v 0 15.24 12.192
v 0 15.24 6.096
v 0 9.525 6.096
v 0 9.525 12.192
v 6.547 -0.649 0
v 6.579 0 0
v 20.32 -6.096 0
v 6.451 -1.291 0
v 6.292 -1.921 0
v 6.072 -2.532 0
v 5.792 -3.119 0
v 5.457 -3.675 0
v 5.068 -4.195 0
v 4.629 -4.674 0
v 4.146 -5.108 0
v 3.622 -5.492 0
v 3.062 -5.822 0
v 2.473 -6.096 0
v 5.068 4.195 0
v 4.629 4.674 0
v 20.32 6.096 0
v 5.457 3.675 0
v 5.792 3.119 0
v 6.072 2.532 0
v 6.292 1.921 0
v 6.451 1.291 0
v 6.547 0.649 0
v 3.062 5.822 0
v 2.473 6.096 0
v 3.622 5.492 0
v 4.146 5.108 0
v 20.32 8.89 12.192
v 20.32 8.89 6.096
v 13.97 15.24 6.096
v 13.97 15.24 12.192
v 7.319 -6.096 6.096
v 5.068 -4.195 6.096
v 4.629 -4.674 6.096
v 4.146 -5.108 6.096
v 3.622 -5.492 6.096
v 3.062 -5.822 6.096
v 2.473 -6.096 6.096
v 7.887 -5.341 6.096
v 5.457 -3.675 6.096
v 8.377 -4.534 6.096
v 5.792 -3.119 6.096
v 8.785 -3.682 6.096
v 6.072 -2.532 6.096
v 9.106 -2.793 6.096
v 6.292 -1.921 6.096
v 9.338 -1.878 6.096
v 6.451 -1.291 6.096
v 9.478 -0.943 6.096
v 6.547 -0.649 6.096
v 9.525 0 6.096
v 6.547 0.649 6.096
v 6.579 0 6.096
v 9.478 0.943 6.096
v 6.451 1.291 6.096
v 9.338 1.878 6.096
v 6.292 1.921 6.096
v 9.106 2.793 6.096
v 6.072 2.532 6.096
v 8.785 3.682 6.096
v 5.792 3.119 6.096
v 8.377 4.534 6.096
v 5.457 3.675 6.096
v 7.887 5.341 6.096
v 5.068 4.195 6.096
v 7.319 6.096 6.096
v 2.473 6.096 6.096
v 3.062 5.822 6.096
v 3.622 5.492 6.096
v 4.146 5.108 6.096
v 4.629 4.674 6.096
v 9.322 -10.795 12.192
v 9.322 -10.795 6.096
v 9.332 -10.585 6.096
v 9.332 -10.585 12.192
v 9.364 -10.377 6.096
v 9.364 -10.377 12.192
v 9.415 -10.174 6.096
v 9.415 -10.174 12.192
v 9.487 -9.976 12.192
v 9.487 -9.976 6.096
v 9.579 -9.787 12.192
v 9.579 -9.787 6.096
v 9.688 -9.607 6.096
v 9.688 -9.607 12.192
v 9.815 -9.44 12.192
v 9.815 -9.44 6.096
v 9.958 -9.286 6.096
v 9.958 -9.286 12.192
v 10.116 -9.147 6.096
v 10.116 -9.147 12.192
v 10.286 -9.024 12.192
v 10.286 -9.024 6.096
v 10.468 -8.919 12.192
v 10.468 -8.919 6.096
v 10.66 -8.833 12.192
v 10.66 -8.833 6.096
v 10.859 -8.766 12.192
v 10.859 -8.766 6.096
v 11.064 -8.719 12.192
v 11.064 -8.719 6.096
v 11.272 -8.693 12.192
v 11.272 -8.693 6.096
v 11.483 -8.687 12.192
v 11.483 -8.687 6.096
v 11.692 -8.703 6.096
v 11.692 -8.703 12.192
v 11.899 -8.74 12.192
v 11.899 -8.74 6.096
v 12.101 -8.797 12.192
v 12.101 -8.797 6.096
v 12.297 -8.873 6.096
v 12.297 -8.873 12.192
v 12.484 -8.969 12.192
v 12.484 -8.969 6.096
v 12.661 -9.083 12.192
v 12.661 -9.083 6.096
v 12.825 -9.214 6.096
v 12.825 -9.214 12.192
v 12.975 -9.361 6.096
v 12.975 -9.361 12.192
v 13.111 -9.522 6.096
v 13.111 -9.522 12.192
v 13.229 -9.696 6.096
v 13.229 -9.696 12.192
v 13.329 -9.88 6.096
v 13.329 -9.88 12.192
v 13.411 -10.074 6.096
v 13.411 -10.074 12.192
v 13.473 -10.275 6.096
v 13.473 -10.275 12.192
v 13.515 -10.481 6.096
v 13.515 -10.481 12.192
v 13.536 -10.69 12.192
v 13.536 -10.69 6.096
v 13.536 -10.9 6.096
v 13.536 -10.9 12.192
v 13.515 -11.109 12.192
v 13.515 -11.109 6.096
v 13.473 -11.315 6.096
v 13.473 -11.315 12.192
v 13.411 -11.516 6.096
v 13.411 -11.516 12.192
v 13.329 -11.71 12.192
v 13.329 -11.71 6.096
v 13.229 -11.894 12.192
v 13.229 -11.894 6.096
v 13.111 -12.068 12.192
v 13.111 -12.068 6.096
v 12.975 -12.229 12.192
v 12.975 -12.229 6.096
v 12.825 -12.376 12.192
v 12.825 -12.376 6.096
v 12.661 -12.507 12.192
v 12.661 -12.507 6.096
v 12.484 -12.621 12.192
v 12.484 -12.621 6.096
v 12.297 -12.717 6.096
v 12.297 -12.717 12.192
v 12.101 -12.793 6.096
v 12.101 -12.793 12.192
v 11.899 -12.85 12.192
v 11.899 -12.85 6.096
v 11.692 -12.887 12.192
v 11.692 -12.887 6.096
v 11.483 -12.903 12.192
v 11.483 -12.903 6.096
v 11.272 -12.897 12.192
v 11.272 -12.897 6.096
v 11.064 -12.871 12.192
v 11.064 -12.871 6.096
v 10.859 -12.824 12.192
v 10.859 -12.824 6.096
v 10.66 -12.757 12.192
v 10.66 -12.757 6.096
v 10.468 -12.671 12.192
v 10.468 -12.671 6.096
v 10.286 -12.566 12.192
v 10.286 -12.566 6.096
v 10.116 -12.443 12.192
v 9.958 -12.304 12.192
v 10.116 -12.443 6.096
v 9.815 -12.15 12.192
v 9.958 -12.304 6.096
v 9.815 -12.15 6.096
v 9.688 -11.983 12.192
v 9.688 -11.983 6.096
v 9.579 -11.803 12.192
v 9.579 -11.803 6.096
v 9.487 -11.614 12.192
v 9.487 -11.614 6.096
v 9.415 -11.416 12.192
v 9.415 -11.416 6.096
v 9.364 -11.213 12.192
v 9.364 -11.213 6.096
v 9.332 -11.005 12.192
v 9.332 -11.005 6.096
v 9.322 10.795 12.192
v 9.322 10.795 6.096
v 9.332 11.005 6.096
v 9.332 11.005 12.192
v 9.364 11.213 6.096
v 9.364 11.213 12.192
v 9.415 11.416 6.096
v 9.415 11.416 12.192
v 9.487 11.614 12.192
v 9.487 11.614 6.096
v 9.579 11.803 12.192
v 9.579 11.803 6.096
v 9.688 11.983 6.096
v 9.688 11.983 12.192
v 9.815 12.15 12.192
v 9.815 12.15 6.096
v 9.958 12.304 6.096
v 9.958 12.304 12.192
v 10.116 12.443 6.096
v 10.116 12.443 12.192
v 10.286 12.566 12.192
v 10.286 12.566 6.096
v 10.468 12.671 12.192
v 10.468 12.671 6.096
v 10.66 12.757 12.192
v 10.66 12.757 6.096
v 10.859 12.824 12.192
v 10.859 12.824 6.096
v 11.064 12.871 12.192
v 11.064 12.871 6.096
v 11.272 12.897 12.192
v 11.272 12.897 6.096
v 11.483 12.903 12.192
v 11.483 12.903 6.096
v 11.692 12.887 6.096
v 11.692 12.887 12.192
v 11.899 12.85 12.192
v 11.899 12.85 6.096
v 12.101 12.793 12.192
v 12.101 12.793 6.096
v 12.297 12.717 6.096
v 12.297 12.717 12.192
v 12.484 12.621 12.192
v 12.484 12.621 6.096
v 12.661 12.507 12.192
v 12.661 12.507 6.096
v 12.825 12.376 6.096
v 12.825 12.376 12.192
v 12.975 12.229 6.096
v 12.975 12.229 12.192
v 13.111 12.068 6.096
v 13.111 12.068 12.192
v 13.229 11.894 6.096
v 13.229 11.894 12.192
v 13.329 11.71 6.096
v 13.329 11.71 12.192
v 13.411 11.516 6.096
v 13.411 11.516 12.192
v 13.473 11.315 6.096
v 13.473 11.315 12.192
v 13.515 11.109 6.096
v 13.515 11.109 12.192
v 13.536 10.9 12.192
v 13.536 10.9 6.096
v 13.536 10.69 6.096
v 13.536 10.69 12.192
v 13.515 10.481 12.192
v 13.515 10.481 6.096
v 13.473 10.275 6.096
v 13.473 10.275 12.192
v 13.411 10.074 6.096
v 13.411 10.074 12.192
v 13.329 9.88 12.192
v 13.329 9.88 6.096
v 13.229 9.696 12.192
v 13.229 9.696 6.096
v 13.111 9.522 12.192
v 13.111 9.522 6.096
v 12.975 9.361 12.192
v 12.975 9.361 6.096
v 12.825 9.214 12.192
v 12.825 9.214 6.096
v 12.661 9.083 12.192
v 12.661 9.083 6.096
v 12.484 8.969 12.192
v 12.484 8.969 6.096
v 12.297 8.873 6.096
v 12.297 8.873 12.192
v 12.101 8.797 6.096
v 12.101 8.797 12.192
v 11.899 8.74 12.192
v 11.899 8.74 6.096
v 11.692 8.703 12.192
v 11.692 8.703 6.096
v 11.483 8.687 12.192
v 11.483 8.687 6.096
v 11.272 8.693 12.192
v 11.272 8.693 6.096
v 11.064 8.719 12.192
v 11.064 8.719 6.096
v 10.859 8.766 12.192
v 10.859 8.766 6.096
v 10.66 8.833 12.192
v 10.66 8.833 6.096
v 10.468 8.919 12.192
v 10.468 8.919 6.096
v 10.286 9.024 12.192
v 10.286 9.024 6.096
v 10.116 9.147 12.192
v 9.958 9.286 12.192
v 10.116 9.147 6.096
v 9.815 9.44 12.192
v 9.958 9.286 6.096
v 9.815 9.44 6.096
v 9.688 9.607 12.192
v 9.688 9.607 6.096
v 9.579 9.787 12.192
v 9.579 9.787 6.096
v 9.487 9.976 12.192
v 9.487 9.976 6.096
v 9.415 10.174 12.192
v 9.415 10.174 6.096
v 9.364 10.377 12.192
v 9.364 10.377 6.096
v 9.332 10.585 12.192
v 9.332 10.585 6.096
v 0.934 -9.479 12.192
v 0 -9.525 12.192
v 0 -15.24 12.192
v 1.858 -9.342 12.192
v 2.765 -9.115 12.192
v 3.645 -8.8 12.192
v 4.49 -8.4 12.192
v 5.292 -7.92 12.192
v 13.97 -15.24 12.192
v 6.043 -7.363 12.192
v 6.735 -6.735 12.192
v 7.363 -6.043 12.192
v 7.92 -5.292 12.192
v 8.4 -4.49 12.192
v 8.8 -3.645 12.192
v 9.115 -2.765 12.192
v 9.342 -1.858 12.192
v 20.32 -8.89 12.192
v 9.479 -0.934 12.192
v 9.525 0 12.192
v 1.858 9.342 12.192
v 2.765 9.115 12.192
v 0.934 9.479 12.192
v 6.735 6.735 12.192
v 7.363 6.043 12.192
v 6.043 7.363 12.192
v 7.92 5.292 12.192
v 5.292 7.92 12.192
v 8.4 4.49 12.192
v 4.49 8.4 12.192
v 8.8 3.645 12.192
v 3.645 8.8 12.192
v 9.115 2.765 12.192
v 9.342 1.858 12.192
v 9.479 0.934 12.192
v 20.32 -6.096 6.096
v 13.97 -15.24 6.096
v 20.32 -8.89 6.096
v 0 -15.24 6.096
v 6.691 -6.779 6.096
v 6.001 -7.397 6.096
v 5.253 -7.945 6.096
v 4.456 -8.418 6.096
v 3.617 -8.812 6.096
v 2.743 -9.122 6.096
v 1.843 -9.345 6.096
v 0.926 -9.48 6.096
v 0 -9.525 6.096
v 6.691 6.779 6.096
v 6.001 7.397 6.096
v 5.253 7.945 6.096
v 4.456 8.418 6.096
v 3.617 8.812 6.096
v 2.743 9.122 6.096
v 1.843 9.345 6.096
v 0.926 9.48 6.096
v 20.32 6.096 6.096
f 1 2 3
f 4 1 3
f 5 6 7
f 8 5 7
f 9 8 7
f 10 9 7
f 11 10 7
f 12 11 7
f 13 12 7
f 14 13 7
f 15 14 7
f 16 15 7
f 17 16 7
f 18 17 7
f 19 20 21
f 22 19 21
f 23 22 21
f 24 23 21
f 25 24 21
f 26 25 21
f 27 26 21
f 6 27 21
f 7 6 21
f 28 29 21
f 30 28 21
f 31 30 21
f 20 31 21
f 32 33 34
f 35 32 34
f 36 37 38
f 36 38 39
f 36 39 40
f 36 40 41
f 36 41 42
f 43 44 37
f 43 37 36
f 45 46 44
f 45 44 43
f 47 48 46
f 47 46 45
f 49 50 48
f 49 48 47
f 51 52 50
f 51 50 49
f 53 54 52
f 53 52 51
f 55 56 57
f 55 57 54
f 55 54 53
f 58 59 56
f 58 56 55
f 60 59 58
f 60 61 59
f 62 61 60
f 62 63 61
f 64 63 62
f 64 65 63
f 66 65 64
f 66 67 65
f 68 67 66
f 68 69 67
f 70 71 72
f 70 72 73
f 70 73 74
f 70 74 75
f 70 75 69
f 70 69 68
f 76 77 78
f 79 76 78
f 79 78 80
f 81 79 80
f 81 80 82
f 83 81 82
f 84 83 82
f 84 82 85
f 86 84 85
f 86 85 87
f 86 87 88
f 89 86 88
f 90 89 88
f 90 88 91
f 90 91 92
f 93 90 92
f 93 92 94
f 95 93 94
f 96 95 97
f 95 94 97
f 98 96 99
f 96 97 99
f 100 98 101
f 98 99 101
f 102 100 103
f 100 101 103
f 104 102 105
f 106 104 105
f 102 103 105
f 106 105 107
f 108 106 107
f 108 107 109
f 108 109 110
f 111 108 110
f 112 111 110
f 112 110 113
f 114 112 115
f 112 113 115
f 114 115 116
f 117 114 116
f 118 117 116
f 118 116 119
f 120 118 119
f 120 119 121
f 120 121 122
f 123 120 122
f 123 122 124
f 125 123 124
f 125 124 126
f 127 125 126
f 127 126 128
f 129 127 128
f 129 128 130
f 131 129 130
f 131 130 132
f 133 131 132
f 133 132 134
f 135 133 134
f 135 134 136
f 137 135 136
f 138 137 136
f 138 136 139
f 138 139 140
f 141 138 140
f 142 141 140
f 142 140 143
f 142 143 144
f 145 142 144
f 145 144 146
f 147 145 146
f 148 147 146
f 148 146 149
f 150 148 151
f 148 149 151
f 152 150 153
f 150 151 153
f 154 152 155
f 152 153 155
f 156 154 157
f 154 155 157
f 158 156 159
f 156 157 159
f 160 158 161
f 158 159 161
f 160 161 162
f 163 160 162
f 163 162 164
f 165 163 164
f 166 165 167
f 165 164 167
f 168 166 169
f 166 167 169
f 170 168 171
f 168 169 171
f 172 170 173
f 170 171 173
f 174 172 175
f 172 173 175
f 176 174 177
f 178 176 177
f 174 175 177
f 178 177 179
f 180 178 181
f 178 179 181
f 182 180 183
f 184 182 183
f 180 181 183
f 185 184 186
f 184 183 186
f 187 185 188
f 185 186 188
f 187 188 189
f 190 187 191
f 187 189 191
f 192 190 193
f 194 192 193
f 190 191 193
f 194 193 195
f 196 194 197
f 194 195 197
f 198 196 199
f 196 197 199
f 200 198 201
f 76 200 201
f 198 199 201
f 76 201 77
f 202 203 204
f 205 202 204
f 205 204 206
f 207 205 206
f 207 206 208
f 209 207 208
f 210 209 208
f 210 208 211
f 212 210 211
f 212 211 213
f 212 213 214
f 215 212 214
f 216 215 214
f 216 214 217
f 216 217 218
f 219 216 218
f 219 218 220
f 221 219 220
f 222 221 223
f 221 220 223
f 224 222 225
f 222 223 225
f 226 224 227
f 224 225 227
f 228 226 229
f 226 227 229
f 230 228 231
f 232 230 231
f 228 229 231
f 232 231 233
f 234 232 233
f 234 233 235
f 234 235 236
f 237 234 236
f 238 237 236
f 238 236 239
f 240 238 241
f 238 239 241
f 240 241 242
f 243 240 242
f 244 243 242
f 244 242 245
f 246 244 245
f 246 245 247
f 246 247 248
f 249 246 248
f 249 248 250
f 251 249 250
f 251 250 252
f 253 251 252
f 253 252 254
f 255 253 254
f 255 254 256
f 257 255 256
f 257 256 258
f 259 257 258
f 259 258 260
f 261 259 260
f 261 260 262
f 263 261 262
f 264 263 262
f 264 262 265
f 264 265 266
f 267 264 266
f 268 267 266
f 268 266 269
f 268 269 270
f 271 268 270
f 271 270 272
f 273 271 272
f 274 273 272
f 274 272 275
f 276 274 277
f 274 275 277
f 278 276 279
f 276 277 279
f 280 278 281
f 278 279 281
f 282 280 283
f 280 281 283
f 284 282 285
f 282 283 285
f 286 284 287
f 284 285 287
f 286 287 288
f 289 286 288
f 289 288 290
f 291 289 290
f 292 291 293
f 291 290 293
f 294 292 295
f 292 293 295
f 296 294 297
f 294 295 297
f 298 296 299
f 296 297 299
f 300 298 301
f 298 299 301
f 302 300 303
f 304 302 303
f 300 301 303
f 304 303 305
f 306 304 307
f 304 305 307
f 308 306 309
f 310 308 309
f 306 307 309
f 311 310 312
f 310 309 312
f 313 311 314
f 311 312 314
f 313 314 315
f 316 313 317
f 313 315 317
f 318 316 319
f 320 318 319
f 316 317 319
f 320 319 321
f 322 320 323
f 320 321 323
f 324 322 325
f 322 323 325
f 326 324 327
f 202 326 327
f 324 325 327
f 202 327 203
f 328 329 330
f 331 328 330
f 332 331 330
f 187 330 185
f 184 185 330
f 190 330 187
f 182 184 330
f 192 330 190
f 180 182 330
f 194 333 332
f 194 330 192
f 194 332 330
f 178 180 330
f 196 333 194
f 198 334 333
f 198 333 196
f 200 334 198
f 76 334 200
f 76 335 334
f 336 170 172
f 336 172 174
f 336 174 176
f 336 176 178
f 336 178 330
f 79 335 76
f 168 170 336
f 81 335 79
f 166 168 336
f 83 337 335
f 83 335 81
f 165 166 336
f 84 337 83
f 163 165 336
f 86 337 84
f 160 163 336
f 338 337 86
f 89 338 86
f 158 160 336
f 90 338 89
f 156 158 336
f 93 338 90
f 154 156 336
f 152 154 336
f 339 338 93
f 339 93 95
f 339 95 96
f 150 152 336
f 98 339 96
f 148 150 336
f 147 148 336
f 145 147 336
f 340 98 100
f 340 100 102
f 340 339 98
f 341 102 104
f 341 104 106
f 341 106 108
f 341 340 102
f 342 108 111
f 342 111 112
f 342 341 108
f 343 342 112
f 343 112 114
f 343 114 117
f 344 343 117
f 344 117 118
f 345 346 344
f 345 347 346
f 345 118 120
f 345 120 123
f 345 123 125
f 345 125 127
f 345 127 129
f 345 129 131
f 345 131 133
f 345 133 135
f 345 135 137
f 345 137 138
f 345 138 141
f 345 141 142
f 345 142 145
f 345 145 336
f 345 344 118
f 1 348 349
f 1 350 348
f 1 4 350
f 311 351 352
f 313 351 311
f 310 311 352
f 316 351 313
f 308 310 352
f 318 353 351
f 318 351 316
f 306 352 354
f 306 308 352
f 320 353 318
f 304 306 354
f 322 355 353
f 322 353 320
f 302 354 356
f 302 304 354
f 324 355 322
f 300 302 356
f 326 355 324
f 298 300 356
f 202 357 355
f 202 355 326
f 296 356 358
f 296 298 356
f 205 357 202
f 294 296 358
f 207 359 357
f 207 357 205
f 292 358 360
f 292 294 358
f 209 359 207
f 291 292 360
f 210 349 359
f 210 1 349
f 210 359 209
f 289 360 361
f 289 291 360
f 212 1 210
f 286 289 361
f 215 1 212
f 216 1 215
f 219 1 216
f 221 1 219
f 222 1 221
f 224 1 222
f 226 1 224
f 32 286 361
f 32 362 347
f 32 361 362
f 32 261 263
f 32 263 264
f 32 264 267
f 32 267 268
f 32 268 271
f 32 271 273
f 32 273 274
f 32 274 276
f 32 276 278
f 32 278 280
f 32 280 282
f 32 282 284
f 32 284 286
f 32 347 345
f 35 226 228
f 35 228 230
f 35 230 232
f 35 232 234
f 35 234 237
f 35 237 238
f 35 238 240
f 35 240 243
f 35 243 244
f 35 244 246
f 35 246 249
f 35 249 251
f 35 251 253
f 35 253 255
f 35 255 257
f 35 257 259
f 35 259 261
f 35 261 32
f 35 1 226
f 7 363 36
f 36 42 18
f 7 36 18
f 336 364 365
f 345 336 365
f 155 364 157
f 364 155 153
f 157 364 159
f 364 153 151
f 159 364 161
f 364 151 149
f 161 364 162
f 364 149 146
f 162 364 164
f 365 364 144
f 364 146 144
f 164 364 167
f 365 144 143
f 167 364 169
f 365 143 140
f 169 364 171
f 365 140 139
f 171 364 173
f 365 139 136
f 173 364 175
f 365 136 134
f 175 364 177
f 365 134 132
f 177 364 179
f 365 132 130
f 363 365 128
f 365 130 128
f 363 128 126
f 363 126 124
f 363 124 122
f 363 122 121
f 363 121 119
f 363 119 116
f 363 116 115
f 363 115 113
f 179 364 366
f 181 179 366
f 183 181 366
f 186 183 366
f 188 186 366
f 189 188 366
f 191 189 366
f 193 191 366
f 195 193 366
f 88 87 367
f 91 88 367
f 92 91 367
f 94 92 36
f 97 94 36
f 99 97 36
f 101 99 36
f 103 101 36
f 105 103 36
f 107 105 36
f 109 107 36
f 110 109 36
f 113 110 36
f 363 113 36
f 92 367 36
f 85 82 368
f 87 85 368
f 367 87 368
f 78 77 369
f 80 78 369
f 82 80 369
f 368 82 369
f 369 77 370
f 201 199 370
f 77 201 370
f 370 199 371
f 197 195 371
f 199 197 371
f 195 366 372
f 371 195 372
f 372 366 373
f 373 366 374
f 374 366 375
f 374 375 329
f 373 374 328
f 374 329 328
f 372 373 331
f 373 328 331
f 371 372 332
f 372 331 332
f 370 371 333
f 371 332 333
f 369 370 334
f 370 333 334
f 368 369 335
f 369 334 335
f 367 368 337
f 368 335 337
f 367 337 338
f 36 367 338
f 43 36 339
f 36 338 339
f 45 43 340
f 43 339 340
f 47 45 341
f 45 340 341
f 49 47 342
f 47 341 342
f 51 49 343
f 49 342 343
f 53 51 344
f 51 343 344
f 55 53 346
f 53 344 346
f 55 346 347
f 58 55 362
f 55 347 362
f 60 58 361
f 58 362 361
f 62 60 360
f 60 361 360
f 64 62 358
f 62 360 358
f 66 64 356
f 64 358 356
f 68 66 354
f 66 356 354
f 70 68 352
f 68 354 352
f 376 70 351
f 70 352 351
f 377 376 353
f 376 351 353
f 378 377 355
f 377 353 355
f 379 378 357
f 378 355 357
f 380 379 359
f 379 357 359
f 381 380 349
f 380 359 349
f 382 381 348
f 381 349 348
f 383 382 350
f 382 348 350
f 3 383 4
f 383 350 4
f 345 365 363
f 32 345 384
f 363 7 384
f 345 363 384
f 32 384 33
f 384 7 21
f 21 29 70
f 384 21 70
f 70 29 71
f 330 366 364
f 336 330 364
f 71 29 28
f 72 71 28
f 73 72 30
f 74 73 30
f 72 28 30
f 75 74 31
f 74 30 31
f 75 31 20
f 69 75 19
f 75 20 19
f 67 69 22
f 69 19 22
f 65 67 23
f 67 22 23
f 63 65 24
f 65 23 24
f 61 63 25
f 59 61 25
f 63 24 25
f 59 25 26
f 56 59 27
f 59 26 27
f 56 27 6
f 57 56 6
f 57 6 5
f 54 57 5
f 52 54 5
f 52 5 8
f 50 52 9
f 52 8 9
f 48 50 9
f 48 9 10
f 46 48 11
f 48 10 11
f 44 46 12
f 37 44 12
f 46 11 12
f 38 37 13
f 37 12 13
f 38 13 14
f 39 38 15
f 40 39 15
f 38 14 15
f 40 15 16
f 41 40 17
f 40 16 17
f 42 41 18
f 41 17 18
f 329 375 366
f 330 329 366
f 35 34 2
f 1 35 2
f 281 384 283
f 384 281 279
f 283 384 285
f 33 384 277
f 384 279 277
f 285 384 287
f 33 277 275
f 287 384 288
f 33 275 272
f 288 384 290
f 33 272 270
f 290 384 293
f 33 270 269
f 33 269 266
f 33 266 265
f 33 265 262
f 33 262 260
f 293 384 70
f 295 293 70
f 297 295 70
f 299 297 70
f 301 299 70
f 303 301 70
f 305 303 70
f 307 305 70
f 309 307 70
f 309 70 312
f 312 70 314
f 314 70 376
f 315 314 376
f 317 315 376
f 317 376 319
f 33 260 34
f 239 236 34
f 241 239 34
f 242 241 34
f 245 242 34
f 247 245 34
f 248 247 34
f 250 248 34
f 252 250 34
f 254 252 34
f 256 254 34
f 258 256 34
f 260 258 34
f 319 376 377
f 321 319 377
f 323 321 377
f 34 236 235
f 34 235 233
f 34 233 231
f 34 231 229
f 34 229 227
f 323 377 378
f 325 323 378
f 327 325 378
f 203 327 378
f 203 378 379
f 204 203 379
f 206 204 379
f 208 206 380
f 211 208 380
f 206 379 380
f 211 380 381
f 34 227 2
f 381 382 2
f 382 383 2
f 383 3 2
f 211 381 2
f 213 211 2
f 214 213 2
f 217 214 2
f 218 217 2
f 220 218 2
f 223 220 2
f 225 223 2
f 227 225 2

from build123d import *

# Parameters (mm, degrees)
F1_DEPTH = 12.192
F3_DEPTH = 20.321
F4_R     = 9.525
F5_DEPTH = 6.096
F7_D     = 4.2164


with BuildPart() as f1:
    # F0 (on Top) → F1 (new body)
    with BuildSketch(Plane.XY):
        with BuildLine():
            ThreePointArc((0, 6.5786), (6.5786, 0), (0, -6.5786))
            Line((0, -6.5786), (0, -15.24))
            Line((0, -15.24), (13.97, -15.24))
            Line((13.97, -15.24), (20.32, -8.89))
            Line((20.32, -8.89), (20.32, 8.89))
            Line((20.32, 8.89), (13.97, 15.24))
            Line((13.97, 15.24), (0, 15.24))
            Line((0, 15.24), (0, 6.5786))
        make_face()
    extrude(amount=F1_DEPTH)

    # F2 (on face) → F3 (cut, through all)
    with BuildSketch(Plane(origin=(0, 0, 0), x_dir=(0, -1, 0), z_dir=(-1, 0, 0))):
        Polygon((-6.096, 6.096), (-15.24, 6.096), (-15.24, -9.260692), (15.24, -9.260692), (15.24, 6.096), (6.096, 6.096), (6.096, -2.733779), (-6.096, -2.733779), align=None)
    extrude(amount=-F3_DEPTH, mode=Mode.SUBTRACT)

    # F4 (on face) → F5 (cut, through all)
    with BuildSketch(Plane.XY.offset(12.192)):
        Circle(F4_R)
    extrude(amount=-F5_DEPTH, mode=Mode.SUBTRACT)

    # F7 (through all)
    with Locations(Plane.XY.offset(12.192)):
        with Locations((11.43, 10.795), (11.43, -10.795)):
            Hole(F7_D / 2)


solid = f1.part
